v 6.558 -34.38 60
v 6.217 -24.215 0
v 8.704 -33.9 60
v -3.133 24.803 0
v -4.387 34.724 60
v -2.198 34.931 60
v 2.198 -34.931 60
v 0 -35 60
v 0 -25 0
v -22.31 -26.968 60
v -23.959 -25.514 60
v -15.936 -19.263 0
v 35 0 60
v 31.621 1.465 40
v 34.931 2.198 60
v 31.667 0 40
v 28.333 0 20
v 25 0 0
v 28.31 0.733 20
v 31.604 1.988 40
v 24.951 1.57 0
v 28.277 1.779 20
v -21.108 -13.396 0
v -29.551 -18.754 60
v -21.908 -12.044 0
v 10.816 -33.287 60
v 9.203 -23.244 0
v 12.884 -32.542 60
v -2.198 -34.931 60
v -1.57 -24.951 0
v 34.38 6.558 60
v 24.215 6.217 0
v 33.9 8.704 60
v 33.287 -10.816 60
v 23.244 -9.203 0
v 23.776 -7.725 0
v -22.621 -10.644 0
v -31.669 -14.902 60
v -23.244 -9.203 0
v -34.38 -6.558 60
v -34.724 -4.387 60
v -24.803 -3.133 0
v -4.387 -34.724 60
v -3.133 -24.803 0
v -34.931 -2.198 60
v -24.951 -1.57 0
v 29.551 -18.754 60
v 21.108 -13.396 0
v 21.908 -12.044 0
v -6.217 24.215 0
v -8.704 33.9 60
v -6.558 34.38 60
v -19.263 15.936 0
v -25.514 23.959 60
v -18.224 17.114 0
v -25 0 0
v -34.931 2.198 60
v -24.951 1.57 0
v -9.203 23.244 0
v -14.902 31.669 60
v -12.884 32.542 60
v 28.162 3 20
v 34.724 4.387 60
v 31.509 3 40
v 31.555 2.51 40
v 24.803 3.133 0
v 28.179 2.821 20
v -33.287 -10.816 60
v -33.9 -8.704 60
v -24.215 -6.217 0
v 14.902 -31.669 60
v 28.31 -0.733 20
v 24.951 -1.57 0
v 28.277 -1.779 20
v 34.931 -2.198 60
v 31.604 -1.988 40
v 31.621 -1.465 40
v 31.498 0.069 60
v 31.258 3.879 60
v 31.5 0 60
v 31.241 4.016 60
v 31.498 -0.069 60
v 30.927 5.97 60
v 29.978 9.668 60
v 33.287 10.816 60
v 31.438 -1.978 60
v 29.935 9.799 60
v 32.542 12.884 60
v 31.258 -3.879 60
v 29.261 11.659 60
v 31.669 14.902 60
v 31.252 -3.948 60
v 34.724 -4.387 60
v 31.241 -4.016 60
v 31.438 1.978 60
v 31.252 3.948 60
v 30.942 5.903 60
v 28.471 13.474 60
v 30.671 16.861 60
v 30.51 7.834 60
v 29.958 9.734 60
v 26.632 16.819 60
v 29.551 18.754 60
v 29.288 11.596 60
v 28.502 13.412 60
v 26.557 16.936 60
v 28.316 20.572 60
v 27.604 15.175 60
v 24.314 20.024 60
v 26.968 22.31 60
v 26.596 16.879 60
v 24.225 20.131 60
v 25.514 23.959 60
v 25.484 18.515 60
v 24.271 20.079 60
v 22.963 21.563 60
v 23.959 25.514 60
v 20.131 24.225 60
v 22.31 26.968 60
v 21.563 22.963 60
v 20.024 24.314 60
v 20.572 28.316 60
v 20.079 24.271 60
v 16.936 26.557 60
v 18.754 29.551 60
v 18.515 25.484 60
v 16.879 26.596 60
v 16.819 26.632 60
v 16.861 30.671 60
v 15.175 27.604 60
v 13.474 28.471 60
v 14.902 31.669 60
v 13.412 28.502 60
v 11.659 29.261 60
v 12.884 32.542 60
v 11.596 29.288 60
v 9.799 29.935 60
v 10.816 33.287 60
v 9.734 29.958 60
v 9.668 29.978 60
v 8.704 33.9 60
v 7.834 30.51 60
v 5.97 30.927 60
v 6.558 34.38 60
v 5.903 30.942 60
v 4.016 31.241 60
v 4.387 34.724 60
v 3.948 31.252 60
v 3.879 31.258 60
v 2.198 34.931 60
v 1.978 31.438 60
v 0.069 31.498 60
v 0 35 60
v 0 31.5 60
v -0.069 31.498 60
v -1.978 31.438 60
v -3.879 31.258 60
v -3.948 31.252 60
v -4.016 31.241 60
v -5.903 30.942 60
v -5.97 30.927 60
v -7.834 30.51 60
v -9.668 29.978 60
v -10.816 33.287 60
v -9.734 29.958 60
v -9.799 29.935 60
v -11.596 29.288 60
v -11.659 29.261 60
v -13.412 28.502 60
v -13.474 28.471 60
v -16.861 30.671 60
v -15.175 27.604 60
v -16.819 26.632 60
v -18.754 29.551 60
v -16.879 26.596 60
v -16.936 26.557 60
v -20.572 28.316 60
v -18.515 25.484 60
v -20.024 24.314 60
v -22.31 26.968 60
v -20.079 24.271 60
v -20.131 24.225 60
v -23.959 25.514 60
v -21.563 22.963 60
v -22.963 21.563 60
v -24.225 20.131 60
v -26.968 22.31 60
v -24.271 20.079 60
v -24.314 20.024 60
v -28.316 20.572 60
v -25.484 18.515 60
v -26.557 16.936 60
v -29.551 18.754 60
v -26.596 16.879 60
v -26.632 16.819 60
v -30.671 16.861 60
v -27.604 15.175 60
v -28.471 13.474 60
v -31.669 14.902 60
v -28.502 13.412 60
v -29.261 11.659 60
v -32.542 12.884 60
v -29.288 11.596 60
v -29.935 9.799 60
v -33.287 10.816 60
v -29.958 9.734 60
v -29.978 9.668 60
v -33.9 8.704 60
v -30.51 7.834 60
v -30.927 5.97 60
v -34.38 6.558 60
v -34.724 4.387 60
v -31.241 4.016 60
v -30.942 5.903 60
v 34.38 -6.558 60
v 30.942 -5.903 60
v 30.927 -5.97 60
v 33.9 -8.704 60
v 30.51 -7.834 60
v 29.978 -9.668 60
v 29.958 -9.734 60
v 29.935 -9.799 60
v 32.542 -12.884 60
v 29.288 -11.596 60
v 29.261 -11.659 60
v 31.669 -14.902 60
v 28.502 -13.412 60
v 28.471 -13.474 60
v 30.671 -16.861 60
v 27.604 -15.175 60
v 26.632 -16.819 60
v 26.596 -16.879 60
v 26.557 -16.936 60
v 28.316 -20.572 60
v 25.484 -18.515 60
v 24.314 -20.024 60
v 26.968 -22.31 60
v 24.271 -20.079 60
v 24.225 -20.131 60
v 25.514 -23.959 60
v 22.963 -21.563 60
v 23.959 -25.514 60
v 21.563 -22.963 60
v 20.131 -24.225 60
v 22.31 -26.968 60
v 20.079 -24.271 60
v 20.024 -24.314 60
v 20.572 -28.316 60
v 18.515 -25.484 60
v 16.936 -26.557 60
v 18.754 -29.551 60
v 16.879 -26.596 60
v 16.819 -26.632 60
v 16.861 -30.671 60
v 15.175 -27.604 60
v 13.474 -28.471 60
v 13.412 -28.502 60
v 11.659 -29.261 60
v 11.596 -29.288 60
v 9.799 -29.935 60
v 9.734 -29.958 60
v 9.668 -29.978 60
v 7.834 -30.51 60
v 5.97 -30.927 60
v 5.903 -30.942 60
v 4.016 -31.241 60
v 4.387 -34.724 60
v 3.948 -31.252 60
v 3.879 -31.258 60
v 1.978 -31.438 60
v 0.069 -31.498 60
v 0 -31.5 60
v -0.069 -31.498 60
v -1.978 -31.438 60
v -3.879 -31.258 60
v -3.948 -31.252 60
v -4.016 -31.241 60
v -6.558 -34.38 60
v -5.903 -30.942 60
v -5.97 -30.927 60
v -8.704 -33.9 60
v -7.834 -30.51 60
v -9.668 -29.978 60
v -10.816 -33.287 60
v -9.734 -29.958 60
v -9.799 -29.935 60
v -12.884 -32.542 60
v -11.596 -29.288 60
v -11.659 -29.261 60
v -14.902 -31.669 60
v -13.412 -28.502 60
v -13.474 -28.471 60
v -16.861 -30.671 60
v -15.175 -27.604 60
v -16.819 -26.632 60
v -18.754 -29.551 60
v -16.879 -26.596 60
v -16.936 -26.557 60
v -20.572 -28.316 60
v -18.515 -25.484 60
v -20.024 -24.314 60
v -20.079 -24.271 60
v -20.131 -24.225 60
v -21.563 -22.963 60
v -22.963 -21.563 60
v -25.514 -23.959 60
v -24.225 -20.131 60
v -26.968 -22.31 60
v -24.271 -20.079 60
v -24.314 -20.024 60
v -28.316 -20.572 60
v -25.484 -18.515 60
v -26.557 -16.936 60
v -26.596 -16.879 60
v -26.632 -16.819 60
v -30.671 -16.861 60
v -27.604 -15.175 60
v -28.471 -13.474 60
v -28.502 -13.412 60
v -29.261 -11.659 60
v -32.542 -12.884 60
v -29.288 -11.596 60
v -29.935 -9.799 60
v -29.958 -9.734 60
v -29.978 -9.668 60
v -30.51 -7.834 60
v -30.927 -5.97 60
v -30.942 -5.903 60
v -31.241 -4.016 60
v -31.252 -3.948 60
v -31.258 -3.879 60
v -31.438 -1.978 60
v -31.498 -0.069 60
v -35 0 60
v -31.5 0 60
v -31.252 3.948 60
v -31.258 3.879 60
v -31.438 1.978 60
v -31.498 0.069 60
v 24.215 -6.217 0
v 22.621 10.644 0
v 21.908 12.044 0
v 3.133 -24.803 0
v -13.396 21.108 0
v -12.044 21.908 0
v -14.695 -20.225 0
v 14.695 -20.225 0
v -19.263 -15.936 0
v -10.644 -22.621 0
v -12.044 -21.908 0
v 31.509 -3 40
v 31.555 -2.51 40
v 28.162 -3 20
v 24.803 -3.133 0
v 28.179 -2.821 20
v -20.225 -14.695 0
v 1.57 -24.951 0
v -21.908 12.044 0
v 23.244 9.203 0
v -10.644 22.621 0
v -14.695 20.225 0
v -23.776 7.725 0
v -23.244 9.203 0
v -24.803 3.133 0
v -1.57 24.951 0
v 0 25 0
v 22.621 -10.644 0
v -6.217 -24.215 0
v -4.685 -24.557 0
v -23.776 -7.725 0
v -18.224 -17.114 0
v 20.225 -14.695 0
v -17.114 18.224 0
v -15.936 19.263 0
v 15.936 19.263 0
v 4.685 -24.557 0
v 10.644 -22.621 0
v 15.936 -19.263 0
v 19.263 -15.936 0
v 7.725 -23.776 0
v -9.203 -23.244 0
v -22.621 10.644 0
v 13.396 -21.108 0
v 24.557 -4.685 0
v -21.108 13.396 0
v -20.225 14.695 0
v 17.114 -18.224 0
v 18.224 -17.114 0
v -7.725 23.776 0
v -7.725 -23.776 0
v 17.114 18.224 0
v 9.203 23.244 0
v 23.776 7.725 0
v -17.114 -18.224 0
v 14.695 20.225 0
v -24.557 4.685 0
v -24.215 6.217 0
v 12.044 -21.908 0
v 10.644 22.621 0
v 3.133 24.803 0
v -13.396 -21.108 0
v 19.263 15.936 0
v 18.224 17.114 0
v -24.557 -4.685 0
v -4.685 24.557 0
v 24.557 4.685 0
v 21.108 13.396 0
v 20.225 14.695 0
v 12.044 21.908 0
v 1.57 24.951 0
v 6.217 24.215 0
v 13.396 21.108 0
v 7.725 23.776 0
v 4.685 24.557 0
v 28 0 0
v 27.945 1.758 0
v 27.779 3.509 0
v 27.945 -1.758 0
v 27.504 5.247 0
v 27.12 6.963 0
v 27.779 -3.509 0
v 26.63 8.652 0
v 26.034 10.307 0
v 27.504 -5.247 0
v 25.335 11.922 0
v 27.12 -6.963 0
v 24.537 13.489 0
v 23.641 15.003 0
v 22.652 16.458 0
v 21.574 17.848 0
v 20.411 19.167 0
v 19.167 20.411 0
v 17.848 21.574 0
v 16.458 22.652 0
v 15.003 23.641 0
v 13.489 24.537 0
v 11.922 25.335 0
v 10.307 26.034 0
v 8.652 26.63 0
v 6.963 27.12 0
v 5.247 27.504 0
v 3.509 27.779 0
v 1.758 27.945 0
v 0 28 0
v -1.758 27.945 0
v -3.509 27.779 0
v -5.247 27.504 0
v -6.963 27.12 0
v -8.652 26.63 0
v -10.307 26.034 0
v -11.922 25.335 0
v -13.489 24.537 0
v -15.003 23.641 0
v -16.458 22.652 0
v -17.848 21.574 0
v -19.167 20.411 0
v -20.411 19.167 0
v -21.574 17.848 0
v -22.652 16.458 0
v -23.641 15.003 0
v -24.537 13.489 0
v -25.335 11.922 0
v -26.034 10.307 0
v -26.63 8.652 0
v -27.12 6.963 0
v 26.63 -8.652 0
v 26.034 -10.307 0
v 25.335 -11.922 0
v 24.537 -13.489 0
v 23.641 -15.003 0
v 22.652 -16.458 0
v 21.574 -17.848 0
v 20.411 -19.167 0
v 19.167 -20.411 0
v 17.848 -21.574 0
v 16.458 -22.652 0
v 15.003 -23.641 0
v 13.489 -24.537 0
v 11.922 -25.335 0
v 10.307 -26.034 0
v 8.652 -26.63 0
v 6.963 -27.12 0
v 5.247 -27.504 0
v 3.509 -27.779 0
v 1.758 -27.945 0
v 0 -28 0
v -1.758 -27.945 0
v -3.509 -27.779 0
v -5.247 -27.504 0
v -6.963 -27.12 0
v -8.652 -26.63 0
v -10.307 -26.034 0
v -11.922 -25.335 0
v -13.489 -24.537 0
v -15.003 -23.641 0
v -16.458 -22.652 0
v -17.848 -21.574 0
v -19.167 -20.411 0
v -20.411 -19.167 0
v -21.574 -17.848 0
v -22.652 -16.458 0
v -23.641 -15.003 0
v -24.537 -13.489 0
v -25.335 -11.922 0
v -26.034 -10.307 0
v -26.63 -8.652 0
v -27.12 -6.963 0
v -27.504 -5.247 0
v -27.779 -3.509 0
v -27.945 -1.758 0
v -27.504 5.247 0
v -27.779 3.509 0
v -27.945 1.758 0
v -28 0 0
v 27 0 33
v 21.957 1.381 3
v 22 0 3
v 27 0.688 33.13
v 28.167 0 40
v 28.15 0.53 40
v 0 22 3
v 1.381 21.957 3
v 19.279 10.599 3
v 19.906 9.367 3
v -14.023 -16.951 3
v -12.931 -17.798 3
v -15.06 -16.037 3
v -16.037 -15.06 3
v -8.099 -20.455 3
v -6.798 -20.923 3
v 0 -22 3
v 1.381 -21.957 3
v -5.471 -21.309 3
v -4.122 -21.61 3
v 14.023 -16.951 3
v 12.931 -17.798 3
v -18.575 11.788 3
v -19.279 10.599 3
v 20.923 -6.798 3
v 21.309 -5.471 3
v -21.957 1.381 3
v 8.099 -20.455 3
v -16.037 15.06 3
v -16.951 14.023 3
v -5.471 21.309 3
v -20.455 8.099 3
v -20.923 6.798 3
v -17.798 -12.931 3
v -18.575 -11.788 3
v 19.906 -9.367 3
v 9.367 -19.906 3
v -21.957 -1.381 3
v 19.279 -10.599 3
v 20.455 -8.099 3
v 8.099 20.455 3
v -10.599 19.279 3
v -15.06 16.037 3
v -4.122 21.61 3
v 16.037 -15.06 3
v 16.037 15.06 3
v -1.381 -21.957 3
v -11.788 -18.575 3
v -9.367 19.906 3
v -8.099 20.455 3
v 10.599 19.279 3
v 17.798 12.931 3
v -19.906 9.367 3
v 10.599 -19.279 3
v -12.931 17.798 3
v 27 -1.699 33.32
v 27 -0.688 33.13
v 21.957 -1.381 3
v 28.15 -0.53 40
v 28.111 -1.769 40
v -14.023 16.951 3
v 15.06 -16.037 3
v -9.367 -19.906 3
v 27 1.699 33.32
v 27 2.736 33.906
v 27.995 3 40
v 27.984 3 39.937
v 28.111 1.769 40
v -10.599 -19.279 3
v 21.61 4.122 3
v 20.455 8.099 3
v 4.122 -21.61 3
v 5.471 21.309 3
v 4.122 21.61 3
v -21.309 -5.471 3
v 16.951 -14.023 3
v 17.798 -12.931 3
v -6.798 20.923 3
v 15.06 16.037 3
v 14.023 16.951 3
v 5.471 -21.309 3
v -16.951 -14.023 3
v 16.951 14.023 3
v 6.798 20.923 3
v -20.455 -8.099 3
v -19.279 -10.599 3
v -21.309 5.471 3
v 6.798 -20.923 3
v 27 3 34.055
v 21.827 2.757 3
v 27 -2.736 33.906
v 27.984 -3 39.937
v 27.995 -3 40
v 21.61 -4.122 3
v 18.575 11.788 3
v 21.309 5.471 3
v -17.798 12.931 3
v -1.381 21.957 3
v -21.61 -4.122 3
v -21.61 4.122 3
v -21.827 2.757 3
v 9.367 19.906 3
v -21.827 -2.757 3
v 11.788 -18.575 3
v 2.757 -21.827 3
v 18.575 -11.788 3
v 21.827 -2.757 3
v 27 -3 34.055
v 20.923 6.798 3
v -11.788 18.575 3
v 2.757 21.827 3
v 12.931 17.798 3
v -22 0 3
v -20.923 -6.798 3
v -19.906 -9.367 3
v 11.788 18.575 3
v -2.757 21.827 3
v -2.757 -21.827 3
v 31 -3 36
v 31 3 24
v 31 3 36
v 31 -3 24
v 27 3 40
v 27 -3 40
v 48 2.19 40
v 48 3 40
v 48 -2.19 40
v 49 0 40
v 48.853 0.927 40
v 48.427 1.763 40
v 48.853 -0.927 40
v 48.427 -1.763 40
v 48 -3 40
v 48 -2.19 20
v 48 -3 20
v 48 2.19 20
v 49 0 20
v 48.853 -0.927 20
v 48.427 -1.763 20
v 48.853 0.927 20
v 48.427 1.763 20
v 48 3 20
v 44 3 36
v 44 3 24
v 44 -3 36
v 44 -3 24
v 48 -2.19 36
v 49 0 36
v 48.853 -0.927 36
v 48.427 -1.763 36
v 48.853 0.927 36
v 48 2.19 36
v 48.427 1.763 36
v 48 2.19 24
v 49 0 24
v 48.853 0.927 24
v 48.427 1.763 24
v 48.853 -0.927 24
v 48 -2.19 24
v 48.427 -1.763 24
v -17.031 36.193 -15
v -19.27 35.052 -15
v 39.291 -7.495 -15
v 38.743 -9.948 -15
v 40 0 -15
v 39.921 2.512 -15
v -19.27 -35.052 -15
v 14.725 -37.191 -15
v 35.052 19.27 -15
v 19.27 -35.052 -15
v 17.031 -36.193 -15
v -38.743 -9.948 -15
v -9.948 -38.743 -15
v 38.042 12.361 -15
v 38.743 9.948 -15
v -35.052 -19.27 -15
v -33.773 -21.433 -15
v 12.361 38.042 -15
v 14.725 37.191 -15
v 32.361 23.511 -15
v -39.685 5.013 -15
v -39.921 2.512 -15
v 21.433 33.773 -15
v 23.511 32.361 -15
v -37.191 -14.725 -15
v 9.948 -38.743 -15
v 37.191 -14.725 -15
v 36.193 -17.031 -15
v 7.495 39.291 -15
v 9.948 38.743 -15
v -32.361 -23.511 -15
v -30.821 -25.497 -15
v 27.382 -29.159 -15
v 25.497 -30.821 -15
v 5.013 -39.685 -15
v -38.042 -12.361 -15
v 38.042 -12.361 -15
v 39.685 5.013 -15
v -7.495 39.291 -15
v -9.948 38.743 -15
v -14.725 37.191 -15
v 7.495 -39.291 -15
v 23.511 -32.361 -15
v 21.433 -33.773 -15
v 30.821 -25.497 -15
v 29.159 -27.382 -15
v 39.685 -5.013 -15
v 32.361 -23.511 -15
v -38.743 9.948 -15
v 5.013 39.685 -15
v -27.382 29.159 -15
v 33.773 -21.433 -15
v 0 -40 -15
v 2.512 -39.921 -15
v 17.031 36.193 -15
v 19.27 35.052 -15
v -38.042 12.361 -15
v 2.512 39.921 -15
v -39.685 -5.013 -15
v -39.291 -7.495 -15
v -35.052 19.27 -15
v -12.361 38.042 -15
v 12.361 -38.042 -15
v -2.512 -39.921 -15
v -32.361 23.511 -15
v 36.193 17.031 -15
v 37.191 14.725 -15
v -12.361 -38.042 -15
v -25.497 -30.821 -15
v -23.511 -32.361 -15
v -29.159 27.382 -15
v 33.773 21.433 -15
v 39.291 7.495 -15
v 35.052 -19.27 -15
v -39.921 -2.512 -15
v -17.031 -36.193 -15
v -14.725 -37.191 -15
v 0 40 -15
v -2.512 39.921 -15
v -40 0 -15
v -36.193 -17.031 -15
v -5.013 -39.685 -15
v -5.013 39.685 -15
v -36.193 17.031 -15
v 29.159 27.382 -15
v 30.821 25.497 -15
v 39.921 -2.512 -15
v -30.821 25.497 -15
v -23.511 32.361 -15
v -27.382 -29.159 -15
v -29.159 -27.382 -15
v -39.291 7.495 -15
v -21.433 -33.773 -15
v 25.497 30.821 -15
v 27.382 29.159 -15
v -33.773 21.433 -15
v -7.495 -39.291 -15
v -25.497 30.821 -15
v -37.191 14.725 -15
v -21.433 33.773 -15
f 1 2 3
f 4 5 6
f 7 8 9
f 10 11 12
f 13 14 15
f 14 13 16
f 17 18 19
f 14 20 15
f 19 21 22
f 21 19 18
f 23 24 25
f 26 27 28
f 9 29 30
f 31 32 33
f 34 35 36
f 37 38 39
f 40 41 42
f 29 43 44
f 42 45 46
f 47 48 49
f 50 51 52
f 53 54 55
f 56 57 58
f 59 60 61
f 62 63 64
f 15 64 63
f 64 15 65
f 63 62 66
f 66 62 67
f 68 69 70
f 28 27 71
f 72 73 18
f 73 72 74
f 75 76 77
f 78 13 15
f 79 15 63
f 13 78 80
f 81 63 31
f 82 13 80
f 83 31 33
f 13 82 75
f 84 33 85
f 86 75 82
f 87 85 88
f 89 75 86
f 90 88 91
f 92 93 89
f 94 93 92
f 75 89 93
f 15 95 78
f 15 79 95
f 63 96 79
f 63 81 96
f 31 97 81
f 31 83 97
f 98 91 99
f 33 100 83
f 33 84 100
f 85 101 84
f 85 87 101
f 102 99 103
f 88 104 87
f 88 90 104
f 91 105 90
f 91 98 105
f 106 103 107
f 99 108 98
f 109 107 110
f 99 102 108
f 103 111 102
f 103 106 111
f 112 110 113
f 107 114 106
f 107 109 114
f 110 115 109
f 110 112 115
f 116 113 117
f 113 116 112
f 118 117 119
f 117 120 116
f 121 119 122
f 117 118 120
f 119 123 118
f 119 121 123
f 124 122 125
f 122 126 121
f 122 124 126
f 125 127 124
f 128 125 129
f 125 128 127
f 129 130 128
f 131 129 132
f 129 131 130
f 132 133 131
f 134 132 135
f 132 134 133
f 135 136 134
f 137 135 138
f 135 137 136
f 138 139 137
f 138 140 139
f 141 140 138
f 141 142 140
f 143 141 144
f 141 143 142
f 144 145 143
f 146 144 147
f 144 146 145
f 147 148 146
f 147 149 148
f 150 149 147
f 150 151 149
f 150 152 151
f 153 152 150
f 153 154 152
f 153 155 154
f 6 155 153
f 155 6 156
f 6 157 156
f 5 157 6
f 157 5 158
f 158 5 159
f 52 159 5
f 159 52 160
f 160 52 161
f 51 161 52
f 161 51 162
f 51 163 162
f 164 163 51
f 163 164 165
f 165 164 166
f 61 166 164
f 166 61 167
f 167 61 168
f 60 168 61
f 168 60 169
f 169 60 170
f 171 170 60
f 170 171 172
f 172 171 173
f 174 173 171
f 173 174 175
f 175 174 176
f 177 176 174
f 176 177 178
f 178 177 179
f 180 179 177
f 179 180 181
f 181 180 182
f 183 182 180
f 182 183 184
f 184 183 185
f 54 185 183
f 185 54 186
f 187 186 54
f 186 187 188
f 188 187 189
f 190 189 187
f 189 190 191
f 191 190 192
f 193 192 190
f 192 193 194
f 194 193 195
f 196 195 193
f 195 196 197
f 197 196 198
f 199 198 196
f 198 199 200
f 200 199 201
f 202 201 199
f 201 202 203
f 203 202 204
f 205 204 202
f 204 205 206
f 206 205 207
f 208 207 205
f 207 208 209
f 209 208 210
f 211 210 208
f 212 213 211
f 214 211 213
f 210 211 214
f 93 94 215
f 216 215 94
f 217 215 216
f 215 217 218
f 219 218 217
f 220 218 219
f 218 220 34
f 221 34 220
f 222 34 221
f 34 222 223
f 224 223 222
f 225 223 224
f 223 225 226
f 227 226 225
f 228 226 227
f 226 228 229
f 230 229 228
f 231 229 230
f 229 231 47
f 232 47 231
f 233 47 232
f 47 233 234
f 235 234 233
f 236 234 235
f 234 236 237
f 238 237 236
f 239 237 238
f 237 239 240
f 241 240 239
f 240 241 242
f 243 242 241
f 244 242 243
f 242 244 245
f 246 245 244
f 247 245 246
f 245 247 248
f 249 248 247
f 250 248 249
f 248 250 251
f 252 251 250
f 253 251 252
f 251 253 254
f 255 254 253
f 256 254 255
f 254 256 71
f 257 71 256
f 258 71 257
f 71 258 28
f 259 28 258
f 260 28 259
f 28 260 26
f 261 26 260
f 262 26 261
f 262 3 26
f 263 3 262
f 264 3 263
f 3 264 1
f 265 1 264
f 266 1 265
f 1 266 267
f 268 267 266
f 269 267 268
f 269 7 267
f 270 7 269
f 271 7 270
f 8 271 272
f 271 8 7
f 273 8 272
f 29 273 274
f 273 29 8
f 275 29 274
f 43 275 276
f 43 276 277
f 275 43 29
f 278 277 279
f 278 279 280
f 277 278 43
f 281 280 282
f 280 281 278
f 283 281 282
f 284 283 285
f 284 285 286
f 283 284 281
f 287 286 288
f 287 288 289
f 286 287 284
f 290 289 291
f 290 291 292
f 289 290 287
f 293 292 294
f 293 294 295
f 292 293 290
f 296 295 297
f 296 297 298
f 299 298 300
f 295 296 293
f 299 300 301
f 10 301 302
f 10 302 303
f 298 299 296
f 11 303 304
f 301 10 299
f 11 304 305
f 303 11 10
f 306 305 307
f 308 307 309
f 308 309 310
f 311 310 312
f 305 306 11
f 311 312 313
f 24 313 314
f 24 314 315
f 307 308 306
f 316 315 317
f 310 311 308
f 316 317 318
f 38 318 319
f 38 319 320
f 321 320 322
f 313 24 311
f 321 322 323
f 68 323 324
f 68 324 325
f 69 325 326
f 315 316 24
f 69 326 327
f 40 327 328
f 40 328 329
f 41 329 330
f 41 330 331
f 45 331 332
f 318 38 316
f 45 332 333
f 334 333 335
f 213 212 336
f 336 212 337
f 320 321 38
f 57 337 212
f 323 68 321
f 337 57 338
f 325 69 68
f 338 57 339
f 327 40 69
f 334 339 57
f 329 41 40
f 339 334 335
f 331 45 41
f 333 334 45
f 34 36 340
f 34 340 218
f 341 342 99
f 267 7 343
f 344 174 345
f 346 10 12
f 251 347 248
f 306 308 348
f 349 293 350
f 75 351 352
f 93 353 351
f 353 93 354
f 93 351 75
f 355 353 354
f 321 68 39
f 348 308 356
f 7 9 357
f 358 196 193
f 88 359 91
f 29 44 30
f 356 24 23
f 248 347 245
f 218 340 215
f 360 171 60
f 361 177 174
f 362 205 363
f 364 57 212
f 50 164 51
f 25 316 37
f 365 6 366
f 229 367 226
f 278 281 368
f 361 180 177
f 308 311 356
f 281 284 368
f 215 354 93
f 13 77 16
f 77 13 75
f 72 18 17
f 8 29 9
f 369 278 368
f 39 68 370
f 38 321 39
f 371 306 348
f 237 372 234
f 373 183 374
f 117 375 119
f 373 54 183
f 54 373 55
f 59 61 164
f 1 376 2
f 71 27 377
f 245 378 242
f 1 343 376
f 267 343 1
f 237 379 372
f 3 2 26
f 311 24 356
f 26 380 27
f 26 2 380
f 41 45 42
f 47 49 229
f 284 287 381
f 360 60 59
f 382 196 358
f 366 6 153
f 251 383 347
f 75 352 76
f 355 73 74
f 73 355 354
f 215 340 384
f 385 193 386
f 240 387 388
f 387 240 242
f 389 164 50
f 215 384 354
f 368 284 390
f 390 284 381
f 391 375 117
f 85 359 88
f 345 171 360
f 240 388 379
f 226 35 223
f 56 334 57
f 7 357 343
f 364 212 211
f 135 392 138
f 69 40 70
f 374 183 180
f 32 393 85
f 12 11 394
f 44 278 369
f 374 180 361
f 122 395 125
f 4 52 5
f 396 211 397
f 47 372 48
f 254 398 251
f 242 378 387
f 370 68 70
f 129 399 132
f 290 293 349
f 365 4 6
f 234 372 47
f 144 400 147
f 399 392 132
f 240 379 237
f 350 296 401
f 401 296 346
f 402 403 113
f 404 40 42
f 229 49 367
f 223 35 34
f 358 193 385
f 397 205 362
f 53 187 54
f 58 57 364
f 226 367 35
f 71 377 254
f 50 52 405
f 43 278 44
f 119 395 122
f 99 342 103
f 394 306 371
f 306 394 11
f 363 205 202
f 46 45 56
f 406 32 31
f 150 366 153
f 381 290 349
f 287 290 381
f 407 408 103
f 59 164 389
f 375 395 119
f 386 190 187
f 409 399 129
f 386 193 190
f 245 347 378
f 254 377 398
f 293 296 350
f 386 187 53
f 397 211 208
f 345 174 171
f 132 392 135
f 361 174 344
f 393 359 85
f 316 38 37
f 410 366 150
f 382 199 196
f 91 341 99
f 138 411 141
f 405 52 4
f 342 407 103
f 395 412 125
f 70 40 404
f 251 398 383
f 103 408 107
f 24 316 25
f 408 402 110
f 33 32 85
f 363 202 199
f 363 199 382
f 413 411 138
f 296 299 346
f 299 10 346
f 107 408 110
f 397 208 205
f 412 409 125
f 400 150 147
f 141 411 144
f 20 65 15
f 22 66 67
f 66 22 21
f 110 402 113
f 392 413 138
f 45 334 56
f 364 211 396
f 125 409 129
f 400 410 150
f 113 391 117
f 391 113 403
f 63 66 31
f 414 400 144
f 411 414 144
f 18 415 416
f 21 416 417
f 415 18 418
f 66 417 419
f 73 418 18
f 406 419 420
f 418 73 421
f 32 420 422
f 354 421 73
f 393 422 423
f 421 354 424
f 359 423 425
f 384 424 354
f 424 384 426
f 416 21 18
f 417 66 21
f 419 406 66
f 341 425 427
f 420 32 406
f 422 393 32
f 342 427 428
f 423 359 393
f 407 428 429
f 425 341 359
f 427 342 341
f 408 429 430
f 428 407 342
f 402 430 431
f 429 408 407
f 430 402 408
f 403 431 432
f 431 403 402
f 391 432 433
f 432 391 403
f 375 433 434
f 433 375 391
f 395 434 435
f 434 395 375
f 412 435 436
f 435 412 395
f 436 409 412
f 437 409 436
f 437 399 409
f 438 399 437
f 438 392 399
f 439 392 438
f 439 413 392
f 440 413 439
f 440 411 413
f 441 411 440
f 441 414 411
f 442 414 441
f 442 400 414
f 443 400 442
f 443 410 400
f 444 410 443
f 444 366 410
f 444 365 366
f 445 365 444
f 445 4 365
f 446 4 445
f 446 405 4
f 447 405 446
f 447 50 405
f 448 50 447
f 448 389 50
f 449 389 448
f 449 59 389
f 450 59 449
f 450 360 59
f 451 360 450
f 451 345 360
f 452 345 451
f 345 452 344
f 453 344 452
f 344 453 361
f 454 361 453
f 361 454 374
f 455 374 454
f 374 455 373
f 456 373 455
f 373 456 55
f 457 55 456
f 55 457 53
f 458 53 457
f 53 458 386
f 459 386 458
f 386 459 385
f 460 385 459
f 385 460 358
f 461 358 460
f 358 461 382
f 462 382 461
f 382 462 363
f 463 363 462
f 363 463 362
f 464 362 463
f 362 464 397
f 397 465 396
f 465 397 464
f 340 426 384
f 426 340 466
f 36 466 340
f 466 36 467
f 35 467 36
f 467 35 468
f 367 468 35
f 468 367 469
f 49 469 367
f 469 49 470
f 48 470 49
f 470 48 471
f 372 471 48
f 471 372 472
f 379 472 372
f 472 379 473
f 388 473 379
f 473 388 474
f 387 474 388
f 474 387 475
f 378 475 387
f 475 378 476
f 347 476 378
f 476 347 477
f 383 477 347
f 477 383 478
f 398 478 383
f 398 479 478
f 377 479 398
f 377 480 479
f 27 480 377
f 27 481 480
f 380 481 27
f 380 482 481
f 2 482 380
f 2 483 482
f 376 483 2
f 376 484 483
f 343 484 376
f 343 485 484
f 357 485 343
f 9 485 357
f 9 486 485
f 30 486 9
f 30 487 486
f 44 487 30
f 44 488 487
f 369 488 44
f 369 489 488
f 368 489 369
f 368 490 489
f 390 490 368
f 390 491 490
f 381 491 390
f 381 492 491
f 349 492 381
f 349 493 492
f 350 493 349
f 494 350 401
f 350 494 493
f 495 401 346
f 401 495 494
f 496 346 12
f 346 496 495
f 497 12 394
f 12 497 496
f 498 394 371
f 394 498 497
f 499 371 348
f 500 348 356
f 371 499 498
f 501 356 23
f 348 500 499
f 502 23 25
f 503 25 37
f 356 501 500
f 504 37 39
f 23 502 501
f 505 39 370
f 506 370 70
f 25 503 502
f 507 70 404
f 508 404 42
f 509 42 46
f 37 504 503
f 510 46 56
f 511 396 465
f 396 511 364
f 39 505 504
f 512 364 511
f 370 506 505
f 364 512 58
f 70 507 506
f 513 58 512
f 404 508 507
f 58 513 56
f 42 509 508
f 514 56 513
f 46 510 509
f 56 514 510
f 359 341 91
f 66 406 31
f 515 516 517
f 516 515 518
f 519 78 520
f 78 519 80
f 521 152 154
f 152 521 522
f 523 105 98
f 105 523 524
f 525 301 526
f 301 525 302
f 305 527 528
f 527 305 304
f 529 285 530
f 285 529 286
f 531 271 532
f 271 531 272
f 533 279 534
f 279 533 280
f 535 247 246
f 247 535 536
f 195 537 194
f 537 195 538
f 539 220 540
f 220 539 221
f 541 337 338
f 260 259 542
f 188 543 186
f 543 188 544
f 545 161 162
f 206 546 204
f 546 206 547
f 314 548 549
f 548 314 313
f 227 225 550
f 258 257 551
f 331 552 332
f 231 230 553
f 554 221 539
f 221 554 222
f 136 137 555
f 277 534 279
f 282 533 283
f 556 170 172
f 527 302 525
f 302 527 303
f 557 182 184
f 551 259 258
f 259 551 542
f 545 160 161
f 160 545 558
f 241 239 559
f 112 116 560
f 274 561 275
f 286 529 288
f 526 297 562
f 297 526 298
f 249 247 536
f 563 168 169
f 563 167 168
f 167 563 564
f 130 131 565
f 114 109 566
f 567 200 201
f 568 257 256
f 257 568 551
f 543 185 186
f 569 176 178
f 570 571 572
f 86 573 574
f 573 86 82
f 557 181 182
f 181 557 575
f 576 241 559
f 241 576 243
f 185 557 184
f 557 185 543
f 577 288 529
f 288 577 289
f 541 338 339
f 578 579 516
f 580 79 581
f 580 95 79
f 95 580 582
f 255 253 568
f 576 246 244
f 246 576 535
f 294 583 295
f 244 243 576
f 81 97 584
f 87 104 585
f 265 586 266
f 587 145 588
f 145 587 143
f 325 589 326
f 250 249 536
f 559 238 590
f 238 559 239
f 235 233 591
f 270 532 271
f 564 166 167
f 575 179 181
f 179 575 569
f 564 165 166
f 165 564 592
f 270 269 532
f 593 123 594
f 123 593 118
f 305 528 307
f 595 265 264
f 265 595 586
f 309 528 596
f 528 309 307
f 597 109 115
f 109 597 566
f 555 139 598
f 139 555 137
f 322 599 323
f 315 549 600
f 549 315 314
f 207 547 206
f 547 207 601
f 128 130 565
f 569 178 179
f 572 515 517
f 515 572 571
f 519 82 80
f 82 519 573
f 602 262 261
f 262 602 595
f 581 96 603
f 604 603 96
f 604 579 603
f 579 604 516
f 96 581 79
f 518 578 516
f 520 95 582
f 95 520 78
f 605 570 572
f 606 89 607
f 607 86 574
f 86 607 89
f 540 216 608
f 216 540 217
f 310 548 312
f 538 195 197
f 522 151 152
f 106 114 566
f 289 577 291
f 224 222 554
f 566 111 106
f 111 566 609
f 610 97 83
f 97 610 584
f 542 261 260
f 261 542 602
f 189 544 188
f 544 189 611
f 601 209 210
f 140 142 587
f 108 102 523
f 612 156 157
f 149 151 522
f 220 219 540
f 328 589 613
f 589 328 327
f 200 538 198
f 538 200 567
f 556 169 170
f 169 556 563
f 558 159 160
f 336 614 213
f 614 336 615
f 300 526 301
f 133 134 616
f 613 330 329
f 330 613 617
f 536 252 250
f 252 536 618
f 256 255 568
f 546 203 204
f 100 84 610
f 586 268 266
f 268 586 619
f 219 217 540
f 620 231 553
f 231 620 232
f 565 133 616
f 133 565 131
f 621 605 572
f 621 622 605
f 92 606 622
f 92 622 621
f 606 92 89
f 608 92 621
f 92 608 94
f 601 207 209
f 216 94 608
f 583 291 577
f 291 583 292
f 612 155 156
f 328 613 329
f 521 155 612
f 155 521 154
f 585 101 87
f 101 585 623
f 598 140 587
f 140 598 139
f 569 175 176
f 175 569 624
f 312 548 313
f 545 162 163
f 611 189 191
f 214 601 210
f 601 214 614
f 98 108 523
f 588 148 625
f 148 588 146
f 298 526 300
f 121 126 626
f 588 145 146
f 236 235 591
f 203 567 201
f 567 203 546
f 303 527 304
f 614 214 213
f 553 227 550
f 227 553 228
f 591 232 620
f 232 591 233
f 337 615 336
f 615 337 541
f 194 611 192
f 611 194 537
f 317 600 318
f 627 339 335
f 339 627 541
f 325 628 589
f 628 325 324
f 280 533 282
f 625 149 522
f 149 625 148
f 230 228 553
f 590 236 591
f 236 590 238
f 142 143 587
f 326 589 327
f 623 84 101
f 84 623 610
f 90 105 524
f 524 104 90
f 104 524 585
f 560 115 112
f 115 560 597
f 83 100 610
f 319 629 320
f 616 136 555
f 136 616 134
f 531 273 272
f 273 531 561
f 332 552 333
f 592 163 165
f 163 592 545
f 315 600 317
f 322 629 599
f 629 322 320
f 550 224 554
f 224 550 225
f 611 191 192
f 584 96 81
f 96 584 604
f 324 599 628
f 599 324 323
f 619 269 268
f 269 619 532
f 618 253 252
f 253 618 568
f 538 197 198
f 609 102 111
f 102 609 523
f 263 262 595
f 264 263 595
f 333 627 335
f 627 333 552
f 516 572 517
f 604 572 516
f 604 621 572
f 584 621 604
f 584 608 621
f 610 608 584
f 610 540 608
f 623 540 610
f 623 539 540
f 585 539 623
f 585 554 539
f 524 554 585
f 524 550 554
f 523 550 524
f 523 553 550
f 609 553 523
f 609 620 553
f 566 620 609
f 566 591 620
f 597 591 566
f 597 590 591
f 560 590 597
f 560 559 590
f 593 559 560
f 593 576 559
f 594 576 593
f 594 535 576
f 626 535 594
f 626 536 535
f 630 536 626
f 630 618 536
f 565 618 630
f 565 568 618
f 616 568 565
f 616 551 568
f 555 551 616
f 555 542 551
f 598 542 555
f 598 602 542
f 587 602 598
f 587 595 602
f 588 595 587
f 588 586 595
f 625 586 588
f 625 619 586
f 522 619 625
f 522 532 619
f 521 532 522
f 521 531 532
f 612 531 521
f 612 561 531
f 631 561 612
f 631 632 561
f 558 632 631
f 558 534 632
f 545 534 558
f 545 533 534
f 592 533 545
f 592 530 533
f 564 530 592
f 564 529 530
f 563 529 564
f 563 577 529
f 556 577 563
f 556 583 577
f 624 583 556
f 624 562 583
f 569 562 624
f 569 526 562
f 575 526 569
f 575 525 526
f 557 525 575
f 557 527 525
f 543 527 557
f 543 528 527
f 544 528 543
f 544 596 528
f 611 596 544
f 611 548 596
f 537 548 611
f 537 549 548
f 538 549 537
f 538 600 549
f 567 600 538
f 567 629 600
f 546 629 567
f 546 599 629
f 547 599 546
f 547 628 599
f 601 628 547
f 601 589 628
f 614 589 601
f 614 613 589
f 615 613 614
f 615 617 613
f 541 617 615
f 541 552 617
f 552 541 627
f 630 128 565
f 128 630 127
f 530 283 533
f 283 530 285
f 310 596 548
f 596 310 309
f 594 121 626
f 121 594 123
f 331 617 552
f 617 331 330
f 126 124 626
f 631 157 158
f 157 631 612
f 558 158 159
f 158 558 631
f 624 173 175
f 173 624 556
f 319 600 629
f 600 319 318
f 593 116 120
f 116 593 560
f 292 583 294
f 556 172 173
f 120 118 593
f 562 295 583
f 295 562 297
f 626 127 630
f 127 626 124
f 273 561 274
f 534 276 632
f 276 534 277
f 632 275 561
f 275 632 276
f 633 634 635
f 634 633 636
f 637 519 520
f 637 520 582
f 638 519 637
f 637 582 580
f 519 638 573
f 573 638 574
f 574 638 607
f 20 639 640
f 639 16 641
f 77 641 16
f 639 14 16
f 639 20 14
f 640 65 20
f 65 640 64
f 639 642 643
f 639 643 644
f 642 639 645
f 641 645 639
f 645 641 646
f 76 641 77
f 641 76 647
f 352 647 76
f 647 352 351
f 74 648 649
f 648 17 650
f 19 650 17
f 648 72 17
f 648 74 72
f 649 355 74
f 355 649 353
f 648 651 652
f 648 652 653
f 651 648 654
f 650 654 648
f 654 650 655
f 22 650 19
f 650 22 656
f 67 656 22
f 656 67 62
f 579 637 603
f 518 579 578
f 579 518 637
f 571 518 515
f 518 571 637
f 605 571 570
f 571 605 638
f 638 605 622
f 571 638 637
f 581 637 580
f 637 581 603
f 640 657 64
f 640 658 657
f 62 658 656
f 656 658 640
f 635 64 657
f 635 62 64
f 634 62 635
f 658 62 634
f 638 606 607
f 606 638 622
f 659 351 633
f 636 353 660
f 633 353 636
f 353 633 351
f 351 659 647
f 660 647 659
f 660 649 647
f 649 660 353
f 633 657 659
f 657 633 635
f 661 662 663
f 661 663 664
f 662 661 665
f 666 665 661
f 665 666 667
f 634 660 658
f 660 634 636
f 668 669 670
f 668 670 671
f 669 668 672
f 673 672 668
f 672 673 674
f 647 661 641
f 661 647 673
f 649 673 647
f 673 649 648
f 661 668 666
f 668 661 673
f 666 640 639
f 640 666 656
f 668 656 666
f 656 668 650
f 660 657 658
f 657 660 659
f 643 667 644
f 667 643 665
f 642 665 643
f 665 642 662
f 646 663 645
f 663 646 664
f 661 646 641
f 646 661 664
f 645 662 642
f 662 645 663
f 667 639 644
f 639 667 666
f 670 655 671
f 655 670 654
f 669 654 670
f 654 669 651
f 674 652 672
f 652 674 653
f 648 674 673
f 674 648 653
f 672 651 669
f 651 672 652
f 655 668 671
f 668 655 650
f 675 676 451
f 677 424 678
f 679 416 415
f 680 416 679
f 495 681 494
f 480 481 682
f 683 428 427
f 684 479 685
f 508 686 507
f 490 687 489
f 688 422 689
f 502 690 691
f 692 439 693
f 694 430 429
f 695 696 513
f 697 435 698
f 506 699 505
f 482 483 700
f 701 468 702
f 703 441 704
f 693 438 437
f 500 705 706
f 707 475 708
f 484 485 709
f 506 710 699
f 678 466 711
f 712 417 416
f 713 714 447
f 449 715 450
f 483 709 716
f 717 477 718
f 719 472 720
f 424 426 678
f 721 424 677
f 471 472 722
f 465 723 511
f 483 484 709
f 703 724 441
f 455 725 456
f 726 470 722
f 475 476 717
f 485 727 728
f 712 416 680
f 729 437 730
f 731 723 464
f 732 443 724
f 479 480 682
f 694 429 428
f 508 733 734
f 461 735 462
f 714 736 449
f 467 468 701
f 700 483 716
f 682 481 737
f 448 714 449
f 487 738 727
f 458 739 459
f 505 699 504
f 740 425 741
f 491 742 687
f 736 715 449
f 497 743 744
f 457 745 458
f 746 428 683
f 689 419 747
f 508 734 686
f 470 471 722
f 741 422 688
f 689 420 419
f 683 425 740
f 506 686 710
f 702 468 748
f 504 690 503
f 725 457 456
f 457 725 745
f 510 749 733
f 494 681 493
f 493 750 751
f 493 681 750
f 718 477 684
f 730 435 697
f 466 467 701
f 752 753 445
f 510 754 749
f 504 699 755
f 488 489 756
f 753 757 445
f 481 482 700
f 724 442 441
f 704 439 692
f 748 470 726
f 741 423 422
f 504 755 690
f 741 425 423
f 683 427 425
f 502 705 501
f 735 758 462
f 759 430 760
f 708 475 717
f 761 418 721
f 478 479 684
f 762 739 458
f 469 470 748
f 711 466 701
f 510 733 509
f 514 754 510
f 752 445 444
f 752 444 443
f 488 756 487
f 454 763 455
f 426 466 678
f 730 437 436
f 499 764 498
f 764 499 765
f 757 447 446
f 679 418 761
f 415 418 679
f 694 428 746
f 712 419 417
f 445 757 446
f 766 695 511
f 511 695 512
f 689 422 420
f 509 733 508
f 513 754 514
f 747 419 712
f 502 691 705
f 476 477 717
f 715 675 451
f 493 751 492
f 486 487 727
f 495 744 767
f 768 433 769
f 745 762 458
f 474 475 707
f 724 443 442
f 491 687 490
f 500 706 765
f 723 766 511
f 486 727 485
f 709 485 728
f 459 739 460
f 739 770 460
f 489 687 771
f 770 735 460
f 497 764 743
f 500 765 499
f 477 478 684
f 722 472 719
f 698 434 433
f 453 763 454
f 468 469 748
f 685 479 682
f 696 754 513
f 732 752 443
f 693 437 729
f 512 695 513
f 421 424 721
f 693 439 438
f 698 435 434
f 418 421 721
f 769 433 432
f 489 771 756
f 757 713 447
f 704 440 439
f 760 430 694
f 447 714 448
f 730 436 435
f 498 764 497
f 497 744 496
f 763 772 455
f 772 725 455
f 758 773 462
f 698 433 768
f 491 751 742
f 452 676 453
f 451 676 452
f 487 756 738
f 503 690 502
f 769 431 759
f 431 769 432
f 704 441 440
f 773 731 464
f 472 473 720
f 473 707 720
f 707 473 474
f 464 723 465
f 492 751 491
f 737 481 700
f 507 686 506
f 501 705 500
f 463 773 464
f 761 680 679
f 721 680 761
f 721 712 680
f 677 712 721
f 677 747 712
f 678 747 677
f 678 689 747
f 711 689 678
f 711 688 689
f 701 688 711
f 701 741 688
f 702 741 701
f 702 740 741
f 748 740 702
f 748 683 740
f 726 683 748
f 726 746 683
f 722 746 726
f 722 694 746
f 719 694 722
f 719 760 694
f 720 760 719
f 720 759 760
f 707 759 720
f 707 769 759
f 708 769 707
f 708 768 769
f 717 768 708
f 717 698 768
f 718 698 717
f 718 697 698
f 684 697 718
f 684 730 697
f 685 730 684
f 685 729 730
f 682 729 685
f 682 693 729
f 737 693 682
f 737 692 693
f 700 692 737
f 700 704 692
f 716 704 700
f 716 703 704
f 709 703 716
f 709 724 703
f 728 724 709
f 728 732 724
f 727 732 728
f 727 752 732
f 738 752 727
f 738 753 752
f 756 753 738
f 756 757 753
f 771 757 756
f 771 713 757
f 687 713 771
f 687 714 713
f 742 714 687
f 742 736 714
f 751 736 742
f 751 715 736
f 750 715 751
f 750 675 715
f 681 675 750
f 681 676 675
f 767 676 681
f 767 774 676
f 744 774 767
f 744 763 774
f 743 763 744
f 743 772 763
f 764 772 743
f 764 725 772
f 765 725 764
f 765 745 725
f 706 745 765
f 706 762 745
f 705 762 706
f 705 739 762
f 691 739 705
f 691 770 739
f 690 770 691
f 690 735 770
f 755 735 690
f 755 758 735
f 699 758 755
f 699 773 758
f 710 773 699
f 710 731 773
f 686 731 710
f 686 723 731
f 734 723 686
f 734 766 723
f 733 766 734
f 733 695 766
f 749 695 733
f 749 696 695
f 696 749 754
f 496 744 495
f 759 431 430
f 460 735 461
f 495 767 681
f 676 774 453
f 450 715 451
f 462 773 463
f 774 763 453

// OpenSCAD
// Decorative cup with SIMPLE and FUNCTIONAL handle

// Parameters
cup_height = 60;
cup_top_radius = 35;
cup_bottom_radius = 25;
cup_wall_thickness = 3;

pedestal_height = 15;
pedestal_radius = 40;
pedestal_top_radius = 28;

handle_width = 8;
handle_thickness = 6;

// Main assembly
union() {
    // Cup with handle
    cup_with_handle();
    
    // Pedestal base
    translate([0, 0, -pedestal_height])
        pedestal();
}

// Cup with handle
module cup_with_handle() {
    union() {
        // Main cup body
        cup_body();
        
        // Simple handle
        simple_handle();
    }
}

// Cup body (hollow cylinder with tapered walls)
module cup_body() {
    difference() {
        // Outer cup shape
        cylinder(h = cup_height, 
                r1 = cup_bottom_radius, 
                r2 = cup_top_radius, 
                $fn = 100);
        
        // Inner hollow space
        translate([0, 0, cup_wall_thickness])
            cylinder(h = cup_height, 
                    r1 = cup_bottom_radius - cup_wall_thickness, 
                    r2 = cup_top_radius - cup_wall_thickness, 
                    $fn = 100);
    }
}

// SIMPLE HANDLE - Easy to understand and functional
module simple_handle() {
    // Handle height and cup radius at that height
    handle_z = cup_height * 0.5; // Middle height
    cup_r = cup_bottom_radius + (cup_top_radius - cup_bottom_radius) * 0.5; // Radius at middle
    
    translate([0, 0, handle_z]) {
        // Rotate to position handle on the side
        rotate([0, 0, 0]) {
            union() {
                // Vertical connection to cup
                translate([cup_r - 1, 0, 0])
                    cube([4, handle_thickness, 20], center = true);
                
                // Horizontal top part
                translate([cup_r + 8, 0, 8])
                    cube([16, handle_thickness, 4], center = true);
                
                // Horizontal bottom part  
                translate([cup_r + 8, 0, -8])
                    cube([16, handle_thickness, 4], center = true);
                
                // Vertical outer part
                translate([cup_r + 16, 0, 0])
                    cube([4, handle_thickness, 20], center = true);
                
                // Rounded corners for better look
                translate([cup_r + 16, 0, 8])
                    cylinder(h = 4, r = handle_thickness/2, center = true, $fn = 20);
                translate([cup_r + 16, 0, -8])
                    cylinder(h = 4, r = handle_thickness/2, center = true, $fn = 20);
            }
        }
    }
}

// Pedestal base
module pedestal() {
    cylinder(h = pedestal_height, 
            r1 = pedestal_radius, 
            r2 = pedestal_top_radius, 
            $fn = 100);
}
